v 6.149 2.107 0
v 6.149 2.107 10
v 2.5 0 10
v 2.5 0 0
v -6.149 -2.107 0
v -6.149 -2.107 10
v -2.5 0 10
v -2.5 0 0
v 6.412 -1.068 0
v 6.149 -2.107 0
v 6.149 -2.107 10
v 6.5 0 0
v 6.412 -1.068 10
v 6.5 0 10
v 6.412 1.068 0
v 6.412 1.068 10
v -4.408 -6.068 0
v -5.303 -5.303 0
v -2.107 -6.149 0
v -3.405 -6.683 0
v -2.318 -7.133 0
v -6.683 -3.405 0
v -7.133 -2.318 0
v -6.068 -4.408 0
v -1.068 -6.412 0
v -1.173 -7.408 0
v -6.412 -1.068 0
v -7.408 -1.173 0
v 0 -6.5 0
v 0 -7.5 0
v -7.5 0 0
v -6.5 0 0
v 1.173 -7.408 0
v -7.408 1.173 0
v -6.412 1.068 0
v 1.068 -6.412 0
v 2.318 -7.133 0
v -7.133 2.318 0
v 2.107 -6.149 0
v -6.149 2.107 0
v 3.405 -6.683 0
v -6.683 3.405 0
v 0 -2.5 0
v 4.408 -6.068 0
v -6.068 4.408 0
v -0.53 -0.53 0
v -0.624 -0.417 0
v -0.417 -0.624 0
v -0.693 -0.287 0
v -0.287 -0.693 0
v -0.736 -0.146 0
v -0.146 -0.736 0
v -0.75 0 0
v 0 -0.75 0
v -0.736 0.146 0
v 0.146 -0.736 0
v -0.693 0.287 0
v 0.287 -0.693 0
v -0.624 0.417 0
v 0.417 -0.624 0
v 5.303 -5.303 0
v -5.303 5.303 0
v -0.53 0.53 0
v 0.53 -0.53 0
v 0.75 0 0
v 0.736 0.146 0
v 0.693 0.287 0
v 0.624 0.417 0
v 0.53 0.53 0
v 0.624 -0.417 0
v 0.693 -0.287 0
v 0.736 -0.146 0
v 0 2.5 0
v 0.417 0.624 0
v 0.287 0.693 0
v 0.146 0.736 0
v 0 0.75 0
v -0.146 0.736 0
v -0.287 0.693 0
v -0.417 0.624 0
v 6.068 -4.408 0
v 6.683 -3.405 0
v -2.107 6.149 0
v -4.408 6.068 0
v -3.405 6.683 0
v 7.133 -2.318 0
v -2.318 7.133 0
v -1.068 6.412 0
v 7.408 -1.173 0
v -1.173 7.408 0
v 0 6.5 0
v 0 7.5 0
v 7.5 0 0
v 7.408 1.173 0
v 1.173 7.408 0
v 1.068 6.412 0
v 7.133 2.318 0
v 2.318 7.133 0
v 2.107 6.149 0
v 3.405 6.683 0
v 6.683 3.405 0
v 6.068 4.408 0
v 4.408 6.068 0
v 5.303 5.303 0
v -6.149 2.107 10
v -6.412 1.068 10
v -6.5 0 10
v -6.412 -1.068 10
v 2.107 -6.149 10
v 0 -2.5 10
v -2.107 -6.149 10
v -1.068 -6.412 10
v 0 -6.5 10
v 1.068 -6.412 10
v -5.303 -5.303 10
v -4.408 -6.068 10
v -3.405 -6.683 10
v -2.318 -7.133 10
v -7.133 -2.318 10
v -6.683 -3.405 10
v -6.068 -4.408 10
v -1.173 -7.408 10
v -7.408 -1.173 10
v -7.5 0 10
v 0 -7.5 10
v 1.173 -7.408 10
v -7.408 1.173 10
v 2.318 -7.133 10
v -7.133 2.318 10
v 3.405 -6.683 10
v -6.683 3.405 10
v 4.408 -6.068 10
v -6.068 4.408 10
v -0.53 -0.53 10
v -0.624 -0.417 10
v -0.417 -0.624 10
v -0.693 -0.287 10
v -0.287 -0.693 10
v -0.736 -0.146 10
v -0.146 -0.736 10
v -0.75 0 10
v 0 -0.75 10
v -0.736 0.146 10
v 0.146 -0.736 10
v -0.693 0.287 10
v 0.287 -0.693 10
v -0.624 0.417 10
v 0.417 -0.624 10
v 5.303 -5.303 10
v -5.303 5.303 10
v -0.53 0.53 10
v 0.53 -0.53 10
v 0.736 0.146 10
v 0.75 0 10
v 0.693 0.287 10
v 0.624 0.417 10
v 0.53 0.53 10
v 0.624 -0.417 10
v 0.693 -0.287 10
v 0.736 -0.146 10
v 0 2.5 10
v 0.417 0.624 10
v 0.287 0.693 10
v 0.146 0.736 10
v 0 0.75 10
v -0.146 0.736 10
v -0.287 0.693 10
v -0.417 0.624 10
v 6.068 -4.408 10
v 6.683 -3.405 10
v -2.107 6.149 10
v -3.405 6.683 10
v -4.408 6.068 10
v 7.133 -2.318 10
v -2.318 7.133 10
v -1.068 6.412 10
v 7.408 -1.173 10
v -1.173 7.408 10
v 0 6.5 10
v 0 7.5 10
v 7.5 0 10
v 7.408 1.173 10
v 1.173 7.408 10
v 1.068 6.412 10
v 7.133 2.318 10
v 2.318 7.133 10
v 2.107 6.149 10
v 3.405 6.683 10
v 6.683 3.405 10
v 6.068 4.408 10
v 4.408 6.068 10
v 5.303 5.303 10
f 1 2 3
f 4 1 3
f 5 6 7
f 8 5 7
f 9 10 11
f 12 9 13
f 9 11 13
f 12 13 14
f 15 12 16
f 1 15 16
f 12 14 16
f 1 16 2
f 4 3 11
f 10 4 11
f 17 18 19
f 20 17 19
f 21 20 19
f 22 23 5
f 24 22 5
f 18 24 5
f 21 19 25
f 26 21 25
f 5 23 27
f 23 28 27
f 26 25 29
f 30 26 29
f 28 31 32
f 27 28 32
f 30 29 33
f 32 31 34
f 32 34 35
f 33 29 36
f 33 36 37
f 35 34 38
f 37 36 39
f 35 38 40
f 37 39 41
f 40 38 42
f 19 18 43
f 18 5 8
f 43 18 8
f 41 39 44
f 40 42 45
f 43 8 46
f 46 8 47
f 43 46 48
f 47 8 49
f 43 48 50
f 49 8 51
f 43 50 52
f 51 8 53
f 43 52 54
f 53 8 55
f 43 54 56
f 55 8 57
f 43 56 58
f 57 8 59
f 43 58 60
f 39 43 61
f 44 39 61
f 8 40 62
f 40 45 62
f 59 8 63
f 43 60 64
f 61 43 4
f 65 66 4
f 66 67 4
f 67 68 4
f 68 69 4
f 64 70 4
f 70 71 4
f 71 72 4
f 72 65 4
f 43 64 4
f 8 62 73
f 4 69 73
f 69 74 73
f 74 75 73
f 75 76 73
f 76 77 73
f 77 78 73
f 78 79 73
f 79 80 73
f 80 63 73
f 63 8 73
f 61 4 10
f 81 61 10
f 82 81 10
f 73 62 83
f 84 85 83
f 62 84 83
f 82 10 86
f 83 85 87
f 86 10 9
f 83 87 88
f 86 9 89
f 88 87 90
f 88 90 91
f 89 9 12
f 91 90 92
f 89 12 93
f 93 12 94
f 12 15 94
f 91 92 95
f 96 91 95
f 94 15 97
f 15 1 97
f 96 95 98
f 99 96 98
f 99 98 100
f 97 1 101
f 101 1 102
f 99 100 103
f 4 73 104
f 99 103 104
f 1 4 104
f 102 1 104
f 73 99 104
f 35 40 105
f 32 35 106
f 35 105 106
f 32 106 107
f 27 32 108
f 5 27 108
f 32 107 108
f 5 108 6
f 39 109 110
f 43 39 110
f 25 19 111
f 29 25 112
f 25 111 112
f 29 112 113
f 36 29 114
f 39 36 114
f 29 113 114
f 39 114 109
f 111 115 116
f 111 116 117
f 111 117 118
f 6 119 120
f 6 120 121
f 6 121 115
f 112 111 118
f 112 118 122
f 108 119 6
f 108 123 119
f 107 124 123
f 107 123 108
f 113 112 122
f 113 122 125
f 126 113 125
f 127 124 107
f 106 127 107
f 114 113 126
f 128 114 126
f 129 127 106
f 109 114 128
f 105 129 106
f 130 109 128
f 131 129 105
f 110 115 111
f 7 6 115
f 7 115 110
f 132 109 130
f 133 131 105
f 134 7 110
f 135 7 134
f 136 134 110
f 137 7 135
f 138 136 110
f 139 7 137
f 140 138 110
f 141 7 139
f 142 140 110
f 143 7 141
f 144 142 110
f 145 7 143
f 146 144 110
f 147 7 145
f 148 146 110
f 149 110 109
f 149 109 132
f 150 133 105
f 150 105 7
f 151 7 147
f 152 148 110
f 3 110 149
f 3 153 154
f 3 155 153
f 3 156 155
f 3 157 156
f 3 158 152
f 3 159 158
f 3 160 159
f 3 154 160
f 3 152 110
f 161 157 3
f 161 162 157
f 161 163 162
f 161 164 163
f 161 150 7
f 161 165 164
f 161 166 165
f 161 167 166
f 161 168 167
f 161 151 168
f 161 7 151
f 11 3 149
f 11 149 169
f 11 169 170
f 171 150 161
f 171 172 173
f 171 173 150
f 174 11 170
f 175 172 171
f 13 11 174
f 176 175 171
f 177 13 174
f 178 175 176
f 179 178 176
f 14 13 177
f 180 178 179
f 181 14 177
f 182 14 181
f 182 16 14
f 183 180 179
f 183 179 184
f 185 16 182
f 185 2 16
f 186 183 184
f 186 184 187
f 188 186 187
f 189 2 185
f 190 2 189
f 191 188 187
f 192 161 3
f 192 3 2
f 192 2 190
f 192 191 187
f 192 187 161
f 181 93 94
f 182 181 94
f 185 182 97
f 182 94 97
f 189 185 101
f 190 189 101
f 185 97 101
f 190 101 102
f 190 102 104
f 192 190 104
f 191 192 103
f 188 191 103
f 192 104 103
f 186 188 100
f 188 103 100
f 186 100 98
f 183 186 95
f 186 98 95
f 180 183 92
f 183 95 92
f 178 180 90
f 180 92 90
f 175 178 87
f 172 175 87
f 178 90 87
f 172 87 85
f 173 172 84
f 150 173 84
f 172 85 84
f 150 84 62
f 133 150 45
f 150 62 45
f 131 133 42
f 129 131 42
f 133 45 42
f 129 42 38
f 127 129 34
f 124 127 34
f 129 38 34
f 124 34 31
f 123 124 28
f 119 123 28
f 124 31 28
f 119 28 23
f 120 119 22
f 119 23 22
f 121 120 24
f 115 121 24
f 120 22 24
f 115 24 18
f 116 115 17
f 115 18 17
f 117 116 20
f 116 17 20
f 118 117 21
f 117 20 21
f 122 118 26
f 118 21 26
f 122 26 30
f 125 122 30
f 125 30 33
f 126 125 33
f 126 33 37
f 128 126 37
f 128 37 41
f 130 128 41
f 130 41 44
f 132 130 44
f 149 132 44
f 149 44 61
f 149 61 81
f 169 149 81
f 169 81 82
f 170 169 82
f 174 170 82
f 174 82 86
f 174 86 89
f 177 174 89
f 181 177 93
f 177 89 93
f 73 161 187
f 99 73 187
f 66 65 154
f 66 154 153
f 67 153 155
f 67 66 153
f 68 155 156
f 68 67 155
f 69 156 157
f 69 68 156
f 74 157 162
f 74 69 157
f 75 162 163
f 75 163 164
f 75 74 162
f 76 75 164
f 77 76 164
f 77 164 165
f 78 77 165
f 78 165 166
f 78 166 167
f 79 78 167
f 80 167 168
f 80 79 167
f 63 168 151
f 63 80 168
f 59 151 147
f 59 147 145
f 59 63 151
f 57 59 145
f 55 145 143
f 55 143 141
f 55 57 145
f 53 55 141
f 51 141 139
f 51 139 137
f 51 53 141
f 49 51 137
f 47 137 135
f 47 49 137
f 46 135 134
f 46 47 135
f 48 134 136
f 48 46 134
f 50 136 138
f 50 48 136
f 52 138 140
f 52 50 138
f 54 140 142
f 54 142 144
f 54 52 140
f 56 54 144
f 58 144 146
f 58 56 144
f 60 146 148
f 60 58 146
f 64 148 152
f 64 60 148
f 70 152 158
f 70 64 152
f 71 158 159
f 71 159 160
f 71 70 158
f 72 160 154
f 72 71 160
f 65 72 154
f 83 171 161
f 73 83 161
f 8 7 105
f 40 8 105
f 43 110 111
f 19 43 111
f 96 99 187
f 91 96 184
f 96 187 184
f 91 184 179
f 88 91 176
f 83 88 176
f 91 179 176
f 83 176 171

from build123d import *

# Parameters (mm, degrees)
SKETCH1_R           = 7.5
SKETCH1_R_2         = 0.75
BOSS_EXTRUDE1_DEPTH = 10
CUT_EXTRUDE1_DEPTH  = 11


with BuildPart() as part:
    # Sketch1 → Boss-Extrude1 (new body)
    with BuildSketch(Plane.XY):
        Circle(SKETCH1_R)
        Circle(SKETCH1_R_2, mode=Mode.SUBTRACT)
    extrude(amount=BOSS_EXTRUDE1_DEPTH)

    # Sketch2 → Cut-Extrude1 (cut, through all)
    with BuildSketch(Plane.XY.offset(10)):
        with BuildLine():
            Line((2.106805951, -6.149094948), (0, -2.5))
            Line((0, -2.5), (-2.106805951, -6.149094948))
            ThreePointArc((-2.106805951, -6.149094948), (0, -6.5), (2.106805951, -6.149094948))
        make_face()
        with BuildLine():
            Line((-6.149094948, -2.106805951), (-2.5, 0))
            Line((-2.5, 0), (-6.149094948, 2.106805951))
            ThreePointArc((-6.149094948, 2.106805951), (-6.5, 0), (-6.149094948, -2.106805951))
        make_face()
        with BuildLine():
            Line((6.149094948, 2.106805951), (2.5, 0))
            Line((2.5, 0), (6.149094948, -2.106805951))
            ThreePointArc((6.149094948, -2.106805951), (6.5, 0), (6.149094948, 2.106805951))
        make_face()
        with BuildLine():
            Line((-2.106805951, 6.149094948), (0, 2.5))
            Line((0, 2.5), (2.106805951, 6.149094948))
            ThreePointArc((2.106805951, 6.149094948), (0, 6.5), (-2.106805951, 6.149094948))
        make_face()
    extrude(amount=-CUT_EXTRUDE1_DEPTH, mode=Mode.SUBTRACT)


solid = part.part
